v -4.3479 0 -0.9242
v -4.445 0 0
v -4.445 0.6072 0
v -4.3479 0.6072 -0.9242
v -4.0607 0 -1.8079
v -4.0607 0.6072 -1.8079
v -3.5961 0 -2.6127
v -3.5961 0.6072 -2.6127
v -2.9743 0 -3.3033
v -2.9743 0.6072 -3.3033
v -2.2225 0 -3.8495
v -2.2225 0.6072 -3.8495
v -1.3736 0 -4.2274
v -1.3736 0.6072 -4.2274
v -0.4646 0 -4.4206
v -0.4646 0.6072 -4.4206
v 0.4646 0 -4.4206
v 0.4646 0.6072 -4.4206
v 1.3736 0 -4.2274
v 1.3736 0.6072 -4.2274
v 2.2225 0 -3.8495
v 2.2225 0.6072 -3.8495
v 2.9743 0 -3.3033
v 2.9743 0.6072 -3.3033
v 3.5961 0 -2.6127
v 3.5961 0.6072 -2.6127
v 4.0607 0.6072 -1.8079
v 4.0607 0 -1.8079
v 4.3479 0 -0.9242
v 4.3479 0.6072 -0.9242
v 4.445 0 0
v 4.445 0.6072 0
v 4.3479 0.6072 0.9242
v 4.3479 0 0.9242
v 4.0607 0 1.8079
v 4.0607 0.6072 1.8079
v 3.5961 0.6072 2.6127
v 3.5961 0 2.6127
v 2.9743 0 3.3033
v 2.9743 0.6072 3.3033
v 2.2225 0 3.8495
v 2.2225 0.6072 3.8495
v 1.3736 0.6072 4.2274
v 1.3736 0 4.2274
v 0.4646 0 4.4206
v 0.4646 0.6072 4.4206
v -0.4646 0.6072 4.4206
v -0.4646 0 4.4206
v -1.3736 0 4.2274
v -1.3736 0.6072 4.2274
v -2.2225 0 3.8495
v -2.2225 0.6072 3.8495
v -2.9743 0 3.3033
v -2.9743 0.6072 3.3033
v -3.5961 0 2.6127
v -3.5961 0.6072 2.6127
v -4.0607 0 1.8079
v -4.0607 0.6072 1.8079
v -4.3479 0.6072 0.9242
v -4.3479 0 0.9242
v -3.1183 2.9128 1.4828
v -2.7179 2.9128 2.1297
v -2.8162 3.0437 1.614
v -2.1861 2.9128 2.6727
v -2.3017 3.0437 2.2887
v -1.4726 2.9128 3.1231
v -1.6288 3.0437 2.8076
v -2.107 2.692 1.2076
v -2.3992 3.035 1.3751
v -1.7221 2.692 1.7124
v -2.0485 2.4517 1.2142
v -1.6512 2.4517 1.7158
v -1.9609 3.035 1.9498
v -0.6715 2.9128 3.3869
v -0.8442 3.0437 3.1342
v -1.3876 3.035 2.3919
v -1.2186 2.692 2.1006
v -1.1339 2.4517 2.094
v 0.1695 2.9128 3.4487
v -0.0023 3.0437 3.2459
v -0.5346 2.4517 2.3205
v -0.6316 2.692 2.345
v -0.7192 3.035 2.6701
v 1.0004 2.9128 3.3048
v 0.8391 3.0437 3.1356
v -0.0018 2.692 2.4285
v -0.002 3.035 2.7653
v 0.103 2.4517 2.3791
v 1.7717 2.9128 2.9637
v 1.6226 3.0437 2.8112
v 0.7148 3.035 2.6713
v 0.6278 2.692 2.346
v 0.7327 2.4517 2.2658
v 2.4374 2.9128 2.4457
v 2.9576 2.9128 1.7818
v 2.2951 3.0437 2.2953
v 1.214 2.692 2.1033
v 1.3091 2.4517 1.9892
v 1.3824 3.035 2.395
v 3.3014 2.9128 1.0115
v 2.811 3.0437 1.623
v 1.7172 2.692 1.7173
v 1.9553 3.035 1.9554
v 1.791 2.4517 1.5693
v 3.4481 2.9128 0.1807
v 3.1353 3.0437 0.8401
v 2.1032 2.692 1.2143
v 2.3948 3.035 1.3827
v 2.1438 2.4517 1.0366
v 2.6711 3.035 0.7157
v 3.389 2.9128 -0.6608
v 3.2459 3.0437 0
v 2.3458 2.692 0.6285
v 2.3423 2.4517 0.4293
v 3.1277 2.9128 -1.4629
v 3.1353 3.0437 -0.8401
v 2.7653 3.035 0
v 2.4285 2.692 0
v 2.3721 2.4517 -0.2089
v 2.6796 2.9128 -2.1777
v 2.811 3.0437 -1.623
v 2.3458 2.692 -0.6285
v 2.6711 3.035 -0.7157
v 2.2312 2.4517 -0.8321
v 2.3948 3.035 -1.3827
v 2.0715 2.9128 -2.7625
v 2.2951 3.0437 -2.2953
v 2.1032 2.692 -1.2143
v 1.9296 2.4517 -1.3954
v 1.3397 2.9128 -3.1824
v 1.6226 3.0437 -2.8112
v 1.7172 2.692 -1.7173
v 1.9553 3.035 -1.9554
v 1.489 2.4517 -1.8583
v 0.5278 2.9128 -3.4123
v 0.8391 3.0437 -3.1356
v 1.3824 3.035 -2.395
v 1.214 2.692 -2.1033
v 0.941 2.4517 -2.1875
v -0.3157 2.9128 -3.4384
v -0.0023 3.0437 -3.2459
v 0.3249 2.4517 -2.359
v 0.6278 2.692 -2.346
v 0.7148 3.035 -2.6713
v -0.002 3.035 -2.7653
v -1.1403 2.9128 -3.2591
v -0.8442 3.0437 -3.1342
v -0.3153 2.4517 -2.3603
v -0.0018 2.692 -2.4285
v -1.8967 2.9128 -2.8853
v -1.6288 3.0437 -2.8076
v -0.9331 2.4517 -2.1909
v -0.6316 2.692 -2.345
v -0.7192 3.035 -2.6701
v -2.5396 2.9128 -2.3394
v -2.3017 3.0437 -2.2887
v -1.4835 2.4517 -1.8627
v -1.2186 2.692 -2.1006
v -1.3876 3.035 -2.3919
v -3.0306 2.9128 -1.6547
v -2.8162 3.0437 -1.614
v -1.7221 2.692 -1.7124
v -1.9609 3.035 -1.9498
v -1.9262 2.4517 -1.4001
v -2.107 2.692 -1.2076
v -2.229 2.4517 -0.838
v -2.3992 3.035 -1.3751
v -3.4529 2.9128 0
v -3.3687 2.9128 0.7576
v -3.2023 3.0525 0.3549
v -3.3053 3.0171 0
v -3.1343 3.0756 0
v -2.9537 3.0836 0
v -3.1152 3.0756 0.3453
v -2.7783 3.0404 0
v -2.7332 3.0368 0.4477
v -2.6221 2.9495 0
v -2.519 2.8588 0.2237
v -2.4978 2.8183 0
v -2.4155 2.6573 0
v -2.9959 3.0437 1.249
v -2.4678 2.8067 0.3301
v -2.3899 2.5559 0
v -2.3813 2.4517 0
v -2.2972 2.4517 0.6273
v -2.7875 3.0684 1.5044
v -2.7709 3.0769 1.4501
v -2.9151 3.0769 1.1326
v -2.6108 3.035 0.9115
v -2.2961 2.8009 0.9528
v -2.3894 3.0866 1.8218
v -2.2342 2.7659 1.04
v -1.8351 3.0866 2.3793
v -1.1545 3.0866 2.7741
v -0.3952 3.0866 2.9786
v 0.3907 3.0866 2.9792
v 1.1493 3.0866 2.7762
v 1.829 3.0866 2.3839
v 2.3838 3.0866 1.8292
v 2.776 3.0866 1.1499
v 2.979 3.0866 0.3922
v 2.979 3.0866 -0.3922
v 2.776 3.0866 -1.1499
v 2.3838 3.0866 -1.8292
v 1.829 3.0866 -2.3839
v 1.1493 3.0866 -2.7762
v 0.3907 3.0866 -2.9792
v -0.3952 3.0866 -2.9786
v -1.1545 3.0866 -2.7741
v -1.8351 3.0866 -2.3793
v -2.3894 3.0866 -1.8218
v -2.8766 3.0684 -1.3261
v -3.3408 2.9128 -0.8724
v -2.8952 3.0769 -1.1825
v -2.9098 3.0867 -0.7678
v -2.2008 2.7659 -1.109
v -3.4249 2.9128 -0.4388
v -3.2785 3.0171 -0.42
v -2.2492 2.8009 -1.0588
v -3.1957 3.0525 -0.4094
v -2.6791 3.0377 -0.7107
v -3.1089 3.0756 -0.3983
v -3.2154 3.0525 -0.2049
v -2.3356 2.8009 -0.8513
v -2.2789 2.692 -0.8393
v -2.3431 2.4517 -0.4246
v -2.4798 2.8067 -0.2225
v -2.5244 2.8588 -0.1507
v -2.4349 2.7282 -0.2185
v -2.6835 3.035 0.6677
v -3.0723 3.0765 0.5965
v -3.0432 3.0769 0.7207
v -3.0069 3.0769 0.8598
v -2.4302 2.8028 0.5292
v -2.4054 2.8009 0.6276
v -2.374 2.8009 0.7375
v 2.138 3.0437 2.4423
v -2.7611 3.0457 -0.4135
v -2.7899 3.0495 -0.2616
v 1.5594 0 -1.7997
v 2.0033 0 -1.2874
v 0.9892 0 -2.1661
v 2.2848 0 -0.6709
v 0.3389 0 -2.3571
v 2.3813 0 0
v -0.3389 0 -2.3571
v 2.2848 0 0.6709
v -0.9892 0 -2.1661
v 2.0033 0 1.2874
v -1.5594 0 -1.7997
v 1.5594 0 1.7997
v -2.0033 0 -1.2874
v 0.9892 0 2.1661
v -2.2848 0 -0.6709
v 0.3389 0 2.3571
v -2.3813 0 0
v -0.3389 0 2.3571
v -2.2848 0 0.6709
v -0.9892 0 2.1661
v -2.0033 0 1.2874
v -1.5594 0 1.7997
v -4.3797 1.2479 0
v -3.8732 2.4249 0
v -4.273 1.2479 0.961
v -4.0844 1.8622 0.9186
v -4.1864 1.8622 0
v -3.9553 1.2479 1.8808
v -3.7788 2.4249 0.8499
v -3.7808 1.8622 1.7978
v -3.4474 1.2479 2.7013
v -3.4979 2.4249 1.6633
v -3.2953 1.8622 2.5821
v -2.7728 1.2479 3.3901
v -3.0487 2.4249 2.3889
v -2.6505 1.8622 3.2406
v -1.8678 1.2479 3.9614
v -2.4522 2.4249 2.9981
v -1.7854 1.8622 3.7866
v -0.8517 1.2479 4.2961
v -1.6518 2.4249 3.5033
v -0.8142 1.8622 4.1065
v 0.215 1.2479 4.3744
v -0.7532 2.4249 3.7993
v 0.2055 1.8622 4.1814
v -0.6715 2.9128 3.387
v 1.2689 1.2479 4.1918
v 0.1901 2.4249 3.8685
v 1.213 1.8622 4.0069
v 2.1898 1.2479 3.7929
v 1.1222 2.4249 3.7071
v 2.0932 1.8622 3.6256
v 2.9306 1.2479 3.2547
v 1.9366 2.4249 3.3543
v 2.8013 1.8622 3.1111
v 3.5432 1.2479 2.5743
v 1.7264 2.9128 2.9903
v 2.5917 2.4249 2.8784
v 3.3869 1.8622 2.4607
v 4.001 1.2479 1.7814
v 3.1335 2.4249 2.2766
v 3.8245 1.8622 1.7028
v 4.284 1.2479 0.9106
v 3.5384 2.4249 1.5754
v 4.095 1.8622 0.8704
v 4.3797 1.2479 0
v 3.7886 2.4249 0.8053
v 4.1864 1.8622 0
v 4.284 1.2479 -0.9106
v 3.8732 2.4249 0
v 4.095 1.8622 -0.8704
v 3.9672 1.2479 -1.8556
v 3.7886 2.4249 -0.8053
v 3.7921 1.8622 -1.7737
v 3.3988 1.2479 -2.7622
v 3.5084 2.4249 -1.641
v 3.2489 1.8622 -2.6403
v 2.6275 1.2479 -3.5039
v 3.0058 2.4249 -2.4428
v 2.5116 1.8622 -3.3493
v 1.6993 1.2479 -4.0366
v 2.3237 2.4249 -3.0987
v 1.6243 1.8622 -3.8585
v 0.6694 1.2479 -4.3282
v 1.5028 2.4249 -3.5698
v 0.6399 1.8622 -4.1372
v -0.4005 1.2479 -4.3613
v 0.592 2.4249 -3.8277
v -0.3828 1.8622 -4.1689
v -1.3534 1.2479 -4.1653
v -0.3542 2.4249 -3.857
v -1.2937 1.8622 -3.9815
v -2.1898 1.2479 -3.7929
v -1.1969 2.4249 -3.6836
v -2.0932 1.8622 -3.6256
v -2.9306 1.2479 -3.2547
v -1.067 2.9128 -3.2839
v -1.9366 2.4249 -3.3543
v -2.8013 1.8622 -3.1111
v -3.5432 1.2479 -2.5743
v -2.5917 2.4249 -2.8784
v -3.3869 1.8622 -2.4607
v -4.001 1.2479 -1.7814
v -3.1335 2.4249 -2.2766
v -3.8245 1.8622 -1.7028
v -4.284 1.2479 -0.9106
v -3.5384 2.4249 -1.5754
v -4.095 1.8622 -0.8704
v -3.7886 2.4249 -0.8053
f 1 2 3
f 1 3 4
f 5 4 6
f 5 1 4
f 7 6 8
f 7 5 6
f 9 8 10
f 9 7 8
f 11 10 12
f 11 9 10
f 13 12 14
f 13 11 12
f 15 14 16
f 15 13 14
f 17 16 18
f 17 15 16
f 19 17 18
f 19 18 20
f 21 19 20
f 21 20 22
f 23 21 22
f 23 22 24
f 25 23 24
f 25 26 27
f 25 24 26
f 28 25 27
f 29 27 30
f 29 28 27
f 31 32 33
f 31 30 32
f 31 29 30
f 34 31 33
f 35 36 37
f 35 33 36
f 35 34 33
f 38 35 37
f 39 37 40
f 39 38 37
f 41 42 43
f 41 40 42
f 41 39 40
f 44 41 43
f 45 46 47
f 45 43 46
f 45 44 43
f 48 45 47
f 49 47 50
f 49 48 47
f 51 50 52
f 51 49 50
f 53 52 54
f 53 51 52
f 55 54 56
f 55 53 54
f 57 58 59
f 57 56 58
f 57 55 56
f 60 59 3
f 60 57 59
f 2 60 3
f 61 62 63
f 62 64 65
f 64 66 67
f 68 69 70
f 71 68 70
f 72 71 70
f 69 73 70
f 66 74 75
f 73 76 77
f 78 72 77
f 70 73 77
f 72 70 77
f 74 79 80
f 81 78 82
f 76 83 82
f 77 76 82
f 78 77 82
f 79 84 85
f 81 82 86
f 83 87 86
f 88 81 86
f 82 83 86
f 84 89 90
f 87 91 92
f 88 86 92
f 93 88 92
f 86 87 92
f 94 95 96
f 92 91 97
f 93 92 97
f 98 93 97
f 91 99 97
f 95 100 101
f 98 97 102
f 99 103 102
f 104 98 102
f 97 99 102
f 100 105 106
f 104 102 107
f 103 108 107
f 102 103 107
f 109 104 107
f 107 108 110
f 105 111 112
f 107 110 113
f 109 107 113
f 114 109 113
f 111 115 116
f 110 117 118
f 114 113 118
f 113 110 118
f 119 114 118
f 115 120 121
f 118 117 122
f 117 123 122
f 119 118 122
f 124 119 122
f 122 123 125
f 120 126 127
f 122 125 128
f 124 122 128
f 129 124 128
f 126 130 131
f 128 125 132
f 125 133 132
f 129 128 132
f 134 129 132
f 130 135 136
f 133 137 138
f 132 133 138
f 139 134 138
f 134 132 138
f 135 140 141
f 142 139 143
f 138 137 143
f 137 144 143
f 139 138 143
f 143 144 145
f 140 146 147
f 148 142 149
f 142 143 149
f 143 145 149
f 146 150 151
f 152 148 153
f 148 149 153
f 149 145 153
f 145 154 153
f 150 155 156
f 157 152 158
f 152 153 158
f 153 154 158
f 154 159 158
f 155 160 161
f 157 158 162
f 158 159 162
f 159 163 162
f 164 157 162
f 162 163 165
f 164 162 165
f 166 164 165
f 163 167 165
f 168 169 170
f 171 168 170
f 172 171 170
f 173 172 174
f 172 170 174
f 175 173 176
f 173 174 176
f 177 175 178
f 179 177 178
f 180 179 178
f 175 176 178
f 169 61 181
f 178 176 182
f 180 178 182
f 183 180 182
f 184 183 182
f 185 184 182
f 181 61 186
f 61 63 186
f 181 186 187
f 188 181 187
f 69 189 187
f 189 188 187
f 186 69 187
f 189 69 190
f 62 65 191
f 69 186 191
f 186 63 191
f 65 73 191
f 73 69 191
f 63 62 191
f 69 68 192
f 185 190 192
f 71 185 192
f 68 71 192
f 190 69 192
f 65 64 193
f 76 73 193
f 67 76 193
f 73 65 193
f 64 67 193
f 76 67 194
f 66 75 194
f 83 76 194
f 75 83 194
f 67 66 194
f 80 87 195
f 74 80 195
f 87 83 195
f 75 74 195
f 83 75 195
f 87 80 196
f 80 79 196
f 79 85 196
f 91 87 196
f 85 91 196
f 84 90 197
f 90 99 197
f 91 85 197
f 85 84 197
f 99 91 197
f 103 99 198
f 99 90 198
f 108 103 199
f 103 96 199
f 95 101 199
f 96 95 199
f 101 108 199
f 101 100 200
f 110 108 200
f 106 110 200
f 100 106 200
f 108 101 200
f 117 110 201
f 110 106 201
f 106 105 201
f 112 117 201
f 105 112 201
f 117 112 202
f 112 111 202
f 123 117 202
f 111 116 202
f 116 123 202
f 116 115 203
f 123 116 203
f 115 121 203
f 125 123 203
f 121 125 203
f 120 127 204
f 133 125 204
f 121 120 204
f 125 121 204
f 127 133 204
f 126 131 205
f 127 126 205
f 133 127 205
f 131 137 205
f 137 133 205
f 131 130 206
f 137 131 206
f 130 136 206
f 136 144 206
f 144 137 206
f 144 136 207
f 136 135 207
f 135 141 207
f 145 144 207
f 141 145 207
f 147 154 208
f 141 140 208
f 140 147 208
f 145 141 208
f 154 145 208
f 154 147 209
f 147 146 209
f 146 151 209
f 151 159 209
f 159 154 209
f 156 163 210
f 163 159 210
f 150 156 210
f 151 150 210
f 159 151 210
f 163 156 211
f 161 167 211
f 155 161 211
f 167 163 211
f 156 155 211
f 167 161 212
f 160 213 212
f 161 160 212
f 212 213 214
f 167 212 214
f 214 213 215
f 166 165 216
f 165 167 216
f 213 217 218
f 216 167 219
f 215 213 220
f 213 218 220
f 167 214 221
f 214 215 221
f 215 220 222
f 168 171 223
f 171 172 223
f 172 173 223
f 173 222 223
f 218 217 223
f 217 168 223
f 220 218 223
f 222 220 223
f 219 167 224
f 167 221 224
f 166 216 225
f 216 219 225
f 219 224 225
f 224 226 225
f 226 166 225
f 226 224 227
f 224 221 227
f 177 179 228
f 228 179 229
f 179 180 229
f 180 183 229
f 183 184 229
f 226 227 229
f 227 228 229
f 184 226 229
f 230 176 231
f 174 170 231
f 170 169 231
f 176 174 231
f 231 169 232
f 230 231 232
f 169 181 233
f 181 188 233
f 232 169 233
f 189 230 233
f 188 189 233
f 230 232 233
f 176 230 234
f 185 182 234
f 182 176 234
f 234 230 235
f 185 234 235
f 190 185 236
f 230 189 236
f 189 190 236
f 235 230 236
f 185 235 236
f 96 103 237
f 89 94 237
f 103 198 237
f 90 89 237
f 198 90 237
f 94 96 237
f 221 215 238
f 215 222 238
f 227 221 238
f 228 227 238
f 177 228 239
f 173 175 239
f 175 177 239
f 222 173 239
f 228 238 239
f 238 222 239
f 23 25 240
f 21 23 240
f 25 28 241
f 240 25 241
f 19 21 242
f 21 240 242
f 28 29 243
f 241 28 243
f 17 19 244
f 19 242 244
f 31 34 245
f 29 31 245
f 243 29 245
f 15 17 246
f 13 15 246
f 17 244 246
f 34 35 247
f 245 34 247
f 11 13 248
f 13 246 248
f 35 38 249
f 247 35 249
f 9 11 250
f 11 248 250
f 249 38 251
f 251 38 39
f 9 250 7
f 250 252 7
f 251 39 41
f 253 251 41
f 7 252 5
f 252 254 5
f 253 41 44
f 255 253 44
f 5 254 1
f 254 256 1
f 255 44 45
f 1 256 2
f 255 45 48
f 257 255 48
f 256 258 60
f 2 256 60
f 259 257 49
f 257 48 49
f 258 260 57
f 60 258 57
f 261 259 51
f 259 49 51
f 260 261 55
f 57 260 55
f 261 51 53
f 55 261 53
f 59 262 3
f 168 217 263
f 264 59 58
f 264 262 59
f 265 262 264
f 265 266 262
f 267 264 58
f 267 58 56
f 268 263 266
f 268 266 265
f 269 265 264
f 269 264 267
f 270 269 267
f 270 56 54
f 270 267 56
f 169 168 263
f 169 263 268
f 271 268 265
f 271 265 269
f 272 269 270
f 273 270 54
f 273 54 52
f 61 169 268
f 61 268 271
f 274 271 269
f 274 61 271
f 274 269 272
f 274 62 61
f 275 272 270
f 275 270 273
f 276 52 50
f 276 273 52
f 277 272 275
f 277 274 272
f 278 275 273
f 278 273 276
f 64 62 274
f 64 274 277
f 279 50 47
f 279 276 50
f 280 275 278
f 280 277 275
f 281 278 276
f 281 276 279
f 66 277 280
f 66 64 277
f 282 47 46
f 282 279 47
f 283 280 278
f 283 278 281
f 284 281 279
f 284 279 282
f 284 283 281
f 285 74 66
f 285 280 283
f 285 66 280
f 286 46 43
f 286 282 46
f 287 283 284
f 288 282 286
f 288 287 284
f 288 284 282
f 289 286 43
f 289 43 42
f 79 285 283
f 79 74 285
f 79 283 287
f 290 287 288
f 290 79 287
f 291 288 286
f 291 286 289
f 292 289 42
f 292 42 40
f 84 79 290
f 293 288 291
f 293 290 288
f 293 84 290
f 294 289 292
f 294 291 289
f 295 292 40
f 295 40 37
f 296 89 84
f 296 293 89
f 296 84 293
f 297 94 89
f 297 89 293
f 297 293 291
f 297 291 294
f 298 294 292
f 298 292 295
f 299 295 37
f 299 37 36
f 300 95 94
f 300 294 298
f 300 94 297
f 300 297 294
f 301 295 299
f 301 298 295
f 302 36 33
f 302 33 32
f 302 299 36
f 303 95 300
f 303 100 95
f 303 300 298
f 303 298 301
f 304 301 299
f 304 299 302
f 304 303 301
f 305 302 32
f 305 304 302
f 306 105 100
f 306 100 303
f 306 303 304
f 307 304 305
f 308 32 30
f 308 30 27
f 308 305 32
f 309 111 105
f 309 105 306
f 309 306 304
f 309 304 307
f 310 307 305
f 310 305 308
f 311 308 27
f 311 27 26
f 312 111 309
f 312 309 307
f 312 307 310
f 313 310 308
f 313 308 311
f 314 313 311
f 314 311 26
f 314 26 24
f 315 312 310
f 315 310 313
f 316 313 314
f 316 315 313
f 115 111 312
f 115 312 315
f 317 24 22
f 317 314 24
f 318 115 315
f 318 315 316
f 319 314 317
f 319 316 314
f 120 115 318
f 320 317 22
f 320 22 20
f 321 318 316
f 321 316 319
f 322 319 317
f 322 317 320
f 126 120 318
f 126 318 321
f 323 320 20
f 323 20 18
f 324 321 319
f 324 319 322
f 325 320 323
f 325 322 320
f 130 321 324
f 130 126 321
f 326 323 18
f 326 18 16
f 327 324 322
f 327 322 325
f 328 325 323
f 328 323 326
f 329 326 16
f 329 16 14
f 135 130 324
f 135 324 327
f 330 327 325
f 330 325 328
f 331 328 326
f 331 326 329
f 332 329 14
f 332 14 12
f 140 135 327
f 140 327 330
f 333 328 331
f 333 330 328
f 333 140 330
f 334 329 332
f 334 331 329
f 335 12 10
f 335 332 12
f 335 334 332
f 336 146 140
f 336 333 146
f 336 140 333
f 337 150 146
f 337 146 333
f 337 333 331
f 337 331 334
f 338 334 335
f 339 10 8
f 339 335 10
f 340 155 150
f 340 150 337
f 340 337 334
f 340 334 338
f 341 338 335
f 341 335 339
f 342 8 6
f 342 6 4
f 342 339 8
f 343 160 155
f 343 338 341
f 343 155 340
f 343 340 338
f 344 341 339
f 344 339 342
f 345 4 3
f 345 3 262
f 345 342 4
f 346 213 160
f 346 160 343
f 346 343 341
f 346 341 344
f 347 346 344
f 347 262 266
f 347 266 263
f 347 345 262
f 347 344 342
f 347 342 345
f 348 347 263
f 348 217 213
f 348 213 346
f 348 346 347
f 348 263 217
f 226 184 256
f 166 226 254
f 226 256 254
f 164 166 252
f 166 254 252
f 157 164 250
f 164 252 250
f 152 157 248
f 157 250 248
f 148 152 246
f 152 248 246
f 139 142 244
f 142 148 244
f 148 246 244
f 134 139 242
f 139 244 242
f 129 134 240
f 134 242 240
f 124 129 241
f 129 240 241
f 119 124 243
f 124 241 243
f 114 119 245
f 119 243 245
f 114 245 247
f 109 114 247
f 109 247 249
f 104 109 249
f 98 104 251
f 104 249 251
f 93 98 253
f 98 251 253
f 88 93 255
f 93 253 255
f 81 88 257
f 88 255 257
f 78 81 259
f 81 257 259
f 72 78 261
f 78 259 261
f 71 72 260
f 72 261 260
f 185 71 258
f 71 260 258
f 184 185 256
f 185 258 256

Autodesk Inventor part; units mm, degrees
ref_plane "YZ Plane" through (0, 0, 0) normal (1, 0, 0) x (0, 1, 0)
ref_plane "XZ Plane" through (0, 0, 0) normal (0, 1, 0) x (-1, 0, 0)
ref_plane "XY Plane" through (0, 0, 0) normal (0, 0, 1) x (1, 0, 0)
sketch "Sketch1" plane through (0, 0, 0) normal (0, 1, 0) x (-1, 0, 0)
  circle A0 centre (0, 0) radius 2.3813
  circle A1 centre (0, 0) radius 4.445
  dimension "d0" = 4.7625
  dimension "d1" = 8.89
extrude "Extrusion1" add sketch "Sketch1" along normal blind 3.5814
fillet "Fillet1" radius 3.175 1 edges at (4.445, 3.5814, 0)
fillet "Fillet2" radius 0.635 1 edges at (2.3813, 3.5814, 0)
properties part number "ELEV_010_BOLTCOVER2" material "Rubber"
